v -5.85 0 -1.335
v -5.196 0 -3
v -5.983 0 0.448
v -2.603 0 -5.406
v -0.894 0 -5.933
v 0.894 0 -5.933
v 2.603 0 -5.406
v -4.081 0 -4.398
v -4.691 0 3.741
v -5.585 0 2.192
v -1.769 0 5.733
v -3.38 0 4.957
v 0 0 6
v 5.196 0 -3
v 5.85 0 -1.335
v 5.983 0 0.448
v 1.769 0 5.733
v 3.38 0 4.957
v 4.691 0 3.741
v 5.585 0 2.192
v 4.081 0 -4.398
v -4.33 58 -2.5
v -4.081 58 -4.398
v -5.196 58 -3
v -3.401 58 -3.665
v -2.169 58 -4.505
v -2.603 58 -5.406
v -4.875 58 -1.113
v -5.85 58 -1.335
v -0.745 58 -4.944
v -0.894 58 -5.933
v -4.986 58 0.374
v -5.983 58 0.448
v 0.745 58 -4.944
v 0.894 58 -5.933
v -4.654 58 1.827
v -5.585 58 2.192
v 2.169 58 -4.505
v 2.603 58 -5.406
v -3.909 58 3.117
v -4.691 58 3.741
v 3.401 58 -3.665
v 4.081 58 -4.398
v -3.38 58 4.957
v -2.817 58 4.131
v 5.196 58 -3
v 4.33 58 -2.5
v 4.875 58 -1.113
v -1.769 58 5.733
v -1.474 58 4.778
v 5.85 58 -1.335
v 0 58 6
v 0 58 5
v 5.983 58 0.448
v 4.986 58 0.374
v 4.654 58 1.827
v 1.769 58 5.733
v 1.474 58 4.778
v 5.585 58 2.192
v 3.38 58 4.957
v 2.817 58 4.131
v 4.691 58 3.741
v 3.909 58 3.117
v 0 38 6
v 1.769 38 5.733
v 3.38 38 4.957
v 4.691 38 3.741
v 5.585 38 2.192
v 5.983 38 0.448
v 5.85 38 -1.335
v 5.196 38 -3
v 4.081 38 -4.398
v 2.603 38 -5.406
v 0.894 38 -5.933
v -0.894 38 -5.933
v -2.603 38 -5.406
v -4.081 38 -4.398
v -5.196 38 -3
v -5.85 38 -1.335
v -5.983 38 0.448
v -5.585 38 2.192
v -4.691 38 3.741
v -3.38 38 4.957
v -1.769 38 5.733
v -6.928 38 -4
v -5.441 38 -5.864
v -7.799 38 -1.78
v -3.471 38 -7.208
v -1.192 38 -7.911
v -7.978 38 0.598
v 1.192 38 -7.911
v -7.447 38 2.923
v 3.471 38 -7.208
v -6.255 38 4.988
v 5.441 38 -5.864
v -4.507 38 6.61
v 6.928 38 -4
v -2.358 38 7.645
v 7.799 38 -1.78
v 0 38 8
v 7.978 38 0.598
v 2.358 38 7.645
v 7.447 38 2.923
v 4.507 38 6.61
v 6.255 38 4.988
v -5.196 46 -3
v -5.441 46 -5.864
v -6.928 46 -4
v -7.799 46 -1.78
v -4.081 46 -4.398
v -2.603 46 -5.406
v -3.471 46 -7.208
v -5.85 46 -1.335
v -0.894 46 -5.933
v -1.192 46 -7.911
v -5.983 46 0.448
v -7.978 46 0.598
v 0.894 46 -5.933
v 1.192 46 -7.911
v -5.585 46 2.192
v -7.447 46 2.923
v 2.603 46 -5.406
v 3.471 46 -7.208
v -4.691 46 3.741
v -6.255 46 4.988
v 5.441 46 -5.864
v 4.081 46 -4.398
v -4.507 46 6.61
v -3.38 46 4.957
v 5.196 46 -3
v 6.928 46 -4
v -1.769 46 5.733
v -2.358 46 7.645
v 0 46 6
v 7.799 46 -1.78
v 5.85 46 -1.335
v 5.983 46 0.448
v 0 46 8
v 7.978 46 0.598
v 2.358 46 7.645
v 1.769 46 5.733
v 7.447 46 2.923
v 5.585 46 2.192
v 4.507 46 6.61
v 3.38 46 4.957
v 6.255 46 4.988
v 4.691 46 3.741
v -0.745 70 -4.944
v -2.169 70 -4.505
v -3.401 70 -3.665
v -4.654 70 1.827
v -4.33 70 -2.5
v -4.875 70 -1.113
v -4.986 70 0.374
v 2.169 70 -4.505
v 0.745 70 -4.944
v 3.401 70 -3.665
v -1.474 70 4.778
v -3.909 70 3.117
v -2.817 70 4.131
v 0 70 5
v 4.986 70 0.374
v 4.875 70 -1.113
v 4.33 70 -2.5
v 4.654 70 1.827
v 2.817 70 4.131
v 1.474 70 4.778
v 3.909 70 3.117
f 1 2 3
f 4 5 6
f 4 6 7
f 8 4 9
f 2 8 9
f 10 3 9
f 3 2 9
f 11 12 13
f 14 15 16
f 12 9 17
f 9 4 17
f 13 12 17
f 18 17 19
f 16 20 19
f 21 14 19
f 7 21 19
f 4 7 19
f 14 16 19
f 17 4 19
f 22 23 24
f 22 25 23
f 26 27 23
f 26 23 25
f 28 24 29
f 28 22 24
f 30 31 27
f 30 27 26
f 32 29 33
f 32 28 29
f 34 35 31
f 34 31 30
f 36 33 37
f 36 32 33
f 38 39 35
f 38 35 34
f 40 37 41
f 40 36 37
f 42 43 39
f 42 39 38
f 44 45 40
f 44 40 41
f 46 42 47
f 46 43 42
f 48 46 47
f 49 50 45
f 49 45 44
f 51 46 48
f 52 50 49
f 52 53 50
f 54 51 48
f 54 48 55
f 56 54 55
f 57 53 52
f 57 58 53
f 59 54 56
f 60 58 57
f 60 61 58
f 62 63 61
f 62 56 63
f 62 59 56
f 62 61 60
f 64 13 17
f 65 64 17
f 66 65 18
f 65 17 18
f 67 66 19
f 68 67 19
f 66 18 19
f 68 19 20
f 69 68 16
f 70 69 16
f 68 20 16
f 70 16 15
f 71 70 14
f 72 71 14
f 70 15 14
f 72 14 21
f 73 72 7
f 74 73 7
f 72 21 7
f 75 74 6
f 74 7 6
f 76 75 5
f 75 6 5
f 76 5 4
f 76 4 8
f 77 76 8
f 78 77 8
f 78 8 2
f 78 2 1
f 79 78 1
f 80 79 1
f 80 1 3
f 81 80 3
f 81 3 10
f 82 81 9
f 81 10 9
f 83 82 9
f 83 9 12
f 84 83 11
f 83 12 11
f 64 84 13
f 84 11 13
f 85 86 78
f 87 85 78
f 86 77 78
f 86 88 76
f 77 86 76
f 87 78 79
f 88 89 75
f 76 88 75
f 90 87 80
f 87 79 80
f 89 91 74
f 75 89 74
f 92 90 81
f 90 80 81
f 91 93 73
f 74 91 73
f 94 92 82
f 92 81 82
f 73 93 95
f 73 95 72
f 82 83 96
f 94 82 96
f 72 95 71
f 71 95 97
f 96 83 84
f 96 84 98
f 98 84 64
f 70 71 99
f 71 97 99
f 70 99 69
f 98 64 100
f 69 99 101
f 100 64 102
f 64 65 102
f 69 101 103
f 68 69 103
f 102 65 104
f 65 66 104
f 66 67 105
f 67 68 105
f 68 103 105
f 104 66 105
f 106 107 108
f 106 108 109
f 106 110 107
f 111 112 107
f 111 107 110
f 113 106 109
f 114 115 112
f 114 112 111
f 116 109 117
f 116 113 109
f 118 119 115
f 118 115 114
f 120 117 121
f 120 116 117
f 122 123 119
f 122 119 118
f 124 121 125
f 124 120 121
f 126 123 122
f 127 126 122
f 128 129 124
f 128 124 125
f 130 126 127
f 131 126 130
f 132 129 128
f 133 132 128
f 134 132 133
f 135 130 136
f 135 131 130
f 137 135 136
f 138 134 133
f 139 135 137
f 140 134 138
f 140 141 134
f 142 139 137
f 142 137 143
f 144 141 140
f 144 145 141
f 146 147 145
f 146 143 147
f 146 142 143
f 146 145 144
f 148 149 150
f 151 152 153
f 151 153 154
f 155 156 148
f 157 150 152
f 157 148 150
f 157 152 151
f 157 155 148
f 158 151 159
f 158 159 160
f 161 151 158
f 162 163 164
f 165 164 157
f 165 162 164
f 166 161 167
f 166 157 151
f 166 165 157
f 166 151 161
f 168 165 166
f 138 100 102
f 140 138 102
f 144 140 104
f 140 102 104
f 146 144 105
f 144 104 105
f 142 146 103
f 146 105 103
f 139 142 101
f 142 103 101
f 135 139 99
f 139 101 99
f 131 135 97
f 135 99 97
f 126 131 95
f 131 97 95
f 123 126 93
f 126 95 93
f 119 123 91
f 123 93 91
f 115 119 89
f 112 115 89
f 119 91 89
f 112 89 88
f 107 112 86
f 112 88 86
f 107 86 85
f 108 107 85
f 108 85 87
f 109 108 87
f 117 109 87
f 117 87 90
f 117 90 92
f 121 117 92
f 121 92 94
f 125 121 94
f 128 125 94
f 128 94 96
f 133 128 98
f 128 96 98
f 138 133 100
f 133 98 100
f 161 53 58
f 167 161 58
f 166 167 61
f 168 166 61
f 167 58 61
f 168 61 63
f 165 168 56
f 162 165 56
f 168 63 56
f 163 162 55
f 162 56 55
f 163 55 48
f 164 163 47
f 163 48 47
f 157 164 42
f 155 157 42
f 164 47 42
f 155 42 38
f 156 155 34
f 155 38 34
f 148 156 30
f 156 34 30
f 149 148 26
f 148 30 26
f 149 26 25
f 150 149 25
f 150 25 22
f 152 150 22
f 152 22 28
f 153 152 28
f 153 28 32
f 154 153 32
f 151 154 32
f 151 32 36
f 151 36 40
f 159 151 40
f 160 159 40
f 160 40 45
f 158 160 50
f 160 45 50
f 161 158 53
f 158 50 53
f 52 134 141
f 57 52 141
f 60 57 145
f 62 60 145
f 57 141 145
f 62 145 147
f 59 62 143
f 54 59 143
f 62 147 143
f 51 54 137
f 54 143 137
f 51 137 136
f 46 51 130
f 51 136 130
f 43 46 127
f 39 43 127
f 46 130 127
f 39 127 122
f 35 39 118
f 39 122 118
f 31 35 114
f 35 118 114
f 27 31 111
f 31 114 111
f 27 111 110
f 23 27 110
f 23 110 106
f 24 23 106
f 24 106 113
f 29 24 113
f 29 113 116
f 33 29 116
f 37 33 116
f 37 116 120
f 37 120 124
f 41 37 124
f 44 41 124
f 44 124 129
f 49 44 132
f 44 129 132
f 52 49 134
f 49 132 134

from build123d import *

# Parameters (mm, degrees)
SKETCH_1_R      = 6
EXTRUDE_1_DEPTH = 38
SKETCH_2_R      = 8
EXTRUDE_2_DEPTH = 8
SKETCH_4_R      = 6
EXTRUDE_3_DEPTH = 12
SKETCH_5_R      = 5
EXTRUDE_4_DEPTH = 12


with BuildPart() as part:
    # 草图1 → 凸台-拉伸1 (new body)
    with BuildSketch(Plane(origin=(0, 0, 0), x_dir=(1, 0, 0), z_dir=(0, 1, 0))):
        with Locations(Location((0, 0, 0), (0, 0, 270))):
            Circle(SKETCH_1_R)
    extrude(amount=EXTRUDE_1_DEPTH)

    # 草图2 → 凸台-拉伸2 (add)
    with BuildSketch(Plane(origin=(0, 38, 0), x_dir=(1, 0, 0), z_dir=(0, 1, 0))):
        with Locations(Location((0, 0, 0), (0, 0, 270))):
            Circle(SKETCH_2_R)
    extrude(amount=EXTRUDE_2_DEPTH)

    # 草图4 → 凸台-拉伸3 (add)
    with BuildSketch(Plane(origin=(0, 46, 0), x_dir=(1, 0, 0), z_dir=(0, 1, 0))):
        with Locations(Location((0, 0, 0), (0, 0, 270))):
            Circle(SKETCH_4_R)
    extrude(amount=EXTRUDE_3_DEPTH)

    # 草图5 → 凸台-拉伸4 (add)
    with BuildSketch(Plane(origin=(0, 58, 0), x_dir=(1, 0, 0), z_dir=(0, 1, 0))):
        with Locations(Location((0, 0, 0), (0, 0, 270))):
            Circle(SKETCH_5_R)
    extrude(amount=EXTRUDE_4_DEPTH)


solid = part.part
